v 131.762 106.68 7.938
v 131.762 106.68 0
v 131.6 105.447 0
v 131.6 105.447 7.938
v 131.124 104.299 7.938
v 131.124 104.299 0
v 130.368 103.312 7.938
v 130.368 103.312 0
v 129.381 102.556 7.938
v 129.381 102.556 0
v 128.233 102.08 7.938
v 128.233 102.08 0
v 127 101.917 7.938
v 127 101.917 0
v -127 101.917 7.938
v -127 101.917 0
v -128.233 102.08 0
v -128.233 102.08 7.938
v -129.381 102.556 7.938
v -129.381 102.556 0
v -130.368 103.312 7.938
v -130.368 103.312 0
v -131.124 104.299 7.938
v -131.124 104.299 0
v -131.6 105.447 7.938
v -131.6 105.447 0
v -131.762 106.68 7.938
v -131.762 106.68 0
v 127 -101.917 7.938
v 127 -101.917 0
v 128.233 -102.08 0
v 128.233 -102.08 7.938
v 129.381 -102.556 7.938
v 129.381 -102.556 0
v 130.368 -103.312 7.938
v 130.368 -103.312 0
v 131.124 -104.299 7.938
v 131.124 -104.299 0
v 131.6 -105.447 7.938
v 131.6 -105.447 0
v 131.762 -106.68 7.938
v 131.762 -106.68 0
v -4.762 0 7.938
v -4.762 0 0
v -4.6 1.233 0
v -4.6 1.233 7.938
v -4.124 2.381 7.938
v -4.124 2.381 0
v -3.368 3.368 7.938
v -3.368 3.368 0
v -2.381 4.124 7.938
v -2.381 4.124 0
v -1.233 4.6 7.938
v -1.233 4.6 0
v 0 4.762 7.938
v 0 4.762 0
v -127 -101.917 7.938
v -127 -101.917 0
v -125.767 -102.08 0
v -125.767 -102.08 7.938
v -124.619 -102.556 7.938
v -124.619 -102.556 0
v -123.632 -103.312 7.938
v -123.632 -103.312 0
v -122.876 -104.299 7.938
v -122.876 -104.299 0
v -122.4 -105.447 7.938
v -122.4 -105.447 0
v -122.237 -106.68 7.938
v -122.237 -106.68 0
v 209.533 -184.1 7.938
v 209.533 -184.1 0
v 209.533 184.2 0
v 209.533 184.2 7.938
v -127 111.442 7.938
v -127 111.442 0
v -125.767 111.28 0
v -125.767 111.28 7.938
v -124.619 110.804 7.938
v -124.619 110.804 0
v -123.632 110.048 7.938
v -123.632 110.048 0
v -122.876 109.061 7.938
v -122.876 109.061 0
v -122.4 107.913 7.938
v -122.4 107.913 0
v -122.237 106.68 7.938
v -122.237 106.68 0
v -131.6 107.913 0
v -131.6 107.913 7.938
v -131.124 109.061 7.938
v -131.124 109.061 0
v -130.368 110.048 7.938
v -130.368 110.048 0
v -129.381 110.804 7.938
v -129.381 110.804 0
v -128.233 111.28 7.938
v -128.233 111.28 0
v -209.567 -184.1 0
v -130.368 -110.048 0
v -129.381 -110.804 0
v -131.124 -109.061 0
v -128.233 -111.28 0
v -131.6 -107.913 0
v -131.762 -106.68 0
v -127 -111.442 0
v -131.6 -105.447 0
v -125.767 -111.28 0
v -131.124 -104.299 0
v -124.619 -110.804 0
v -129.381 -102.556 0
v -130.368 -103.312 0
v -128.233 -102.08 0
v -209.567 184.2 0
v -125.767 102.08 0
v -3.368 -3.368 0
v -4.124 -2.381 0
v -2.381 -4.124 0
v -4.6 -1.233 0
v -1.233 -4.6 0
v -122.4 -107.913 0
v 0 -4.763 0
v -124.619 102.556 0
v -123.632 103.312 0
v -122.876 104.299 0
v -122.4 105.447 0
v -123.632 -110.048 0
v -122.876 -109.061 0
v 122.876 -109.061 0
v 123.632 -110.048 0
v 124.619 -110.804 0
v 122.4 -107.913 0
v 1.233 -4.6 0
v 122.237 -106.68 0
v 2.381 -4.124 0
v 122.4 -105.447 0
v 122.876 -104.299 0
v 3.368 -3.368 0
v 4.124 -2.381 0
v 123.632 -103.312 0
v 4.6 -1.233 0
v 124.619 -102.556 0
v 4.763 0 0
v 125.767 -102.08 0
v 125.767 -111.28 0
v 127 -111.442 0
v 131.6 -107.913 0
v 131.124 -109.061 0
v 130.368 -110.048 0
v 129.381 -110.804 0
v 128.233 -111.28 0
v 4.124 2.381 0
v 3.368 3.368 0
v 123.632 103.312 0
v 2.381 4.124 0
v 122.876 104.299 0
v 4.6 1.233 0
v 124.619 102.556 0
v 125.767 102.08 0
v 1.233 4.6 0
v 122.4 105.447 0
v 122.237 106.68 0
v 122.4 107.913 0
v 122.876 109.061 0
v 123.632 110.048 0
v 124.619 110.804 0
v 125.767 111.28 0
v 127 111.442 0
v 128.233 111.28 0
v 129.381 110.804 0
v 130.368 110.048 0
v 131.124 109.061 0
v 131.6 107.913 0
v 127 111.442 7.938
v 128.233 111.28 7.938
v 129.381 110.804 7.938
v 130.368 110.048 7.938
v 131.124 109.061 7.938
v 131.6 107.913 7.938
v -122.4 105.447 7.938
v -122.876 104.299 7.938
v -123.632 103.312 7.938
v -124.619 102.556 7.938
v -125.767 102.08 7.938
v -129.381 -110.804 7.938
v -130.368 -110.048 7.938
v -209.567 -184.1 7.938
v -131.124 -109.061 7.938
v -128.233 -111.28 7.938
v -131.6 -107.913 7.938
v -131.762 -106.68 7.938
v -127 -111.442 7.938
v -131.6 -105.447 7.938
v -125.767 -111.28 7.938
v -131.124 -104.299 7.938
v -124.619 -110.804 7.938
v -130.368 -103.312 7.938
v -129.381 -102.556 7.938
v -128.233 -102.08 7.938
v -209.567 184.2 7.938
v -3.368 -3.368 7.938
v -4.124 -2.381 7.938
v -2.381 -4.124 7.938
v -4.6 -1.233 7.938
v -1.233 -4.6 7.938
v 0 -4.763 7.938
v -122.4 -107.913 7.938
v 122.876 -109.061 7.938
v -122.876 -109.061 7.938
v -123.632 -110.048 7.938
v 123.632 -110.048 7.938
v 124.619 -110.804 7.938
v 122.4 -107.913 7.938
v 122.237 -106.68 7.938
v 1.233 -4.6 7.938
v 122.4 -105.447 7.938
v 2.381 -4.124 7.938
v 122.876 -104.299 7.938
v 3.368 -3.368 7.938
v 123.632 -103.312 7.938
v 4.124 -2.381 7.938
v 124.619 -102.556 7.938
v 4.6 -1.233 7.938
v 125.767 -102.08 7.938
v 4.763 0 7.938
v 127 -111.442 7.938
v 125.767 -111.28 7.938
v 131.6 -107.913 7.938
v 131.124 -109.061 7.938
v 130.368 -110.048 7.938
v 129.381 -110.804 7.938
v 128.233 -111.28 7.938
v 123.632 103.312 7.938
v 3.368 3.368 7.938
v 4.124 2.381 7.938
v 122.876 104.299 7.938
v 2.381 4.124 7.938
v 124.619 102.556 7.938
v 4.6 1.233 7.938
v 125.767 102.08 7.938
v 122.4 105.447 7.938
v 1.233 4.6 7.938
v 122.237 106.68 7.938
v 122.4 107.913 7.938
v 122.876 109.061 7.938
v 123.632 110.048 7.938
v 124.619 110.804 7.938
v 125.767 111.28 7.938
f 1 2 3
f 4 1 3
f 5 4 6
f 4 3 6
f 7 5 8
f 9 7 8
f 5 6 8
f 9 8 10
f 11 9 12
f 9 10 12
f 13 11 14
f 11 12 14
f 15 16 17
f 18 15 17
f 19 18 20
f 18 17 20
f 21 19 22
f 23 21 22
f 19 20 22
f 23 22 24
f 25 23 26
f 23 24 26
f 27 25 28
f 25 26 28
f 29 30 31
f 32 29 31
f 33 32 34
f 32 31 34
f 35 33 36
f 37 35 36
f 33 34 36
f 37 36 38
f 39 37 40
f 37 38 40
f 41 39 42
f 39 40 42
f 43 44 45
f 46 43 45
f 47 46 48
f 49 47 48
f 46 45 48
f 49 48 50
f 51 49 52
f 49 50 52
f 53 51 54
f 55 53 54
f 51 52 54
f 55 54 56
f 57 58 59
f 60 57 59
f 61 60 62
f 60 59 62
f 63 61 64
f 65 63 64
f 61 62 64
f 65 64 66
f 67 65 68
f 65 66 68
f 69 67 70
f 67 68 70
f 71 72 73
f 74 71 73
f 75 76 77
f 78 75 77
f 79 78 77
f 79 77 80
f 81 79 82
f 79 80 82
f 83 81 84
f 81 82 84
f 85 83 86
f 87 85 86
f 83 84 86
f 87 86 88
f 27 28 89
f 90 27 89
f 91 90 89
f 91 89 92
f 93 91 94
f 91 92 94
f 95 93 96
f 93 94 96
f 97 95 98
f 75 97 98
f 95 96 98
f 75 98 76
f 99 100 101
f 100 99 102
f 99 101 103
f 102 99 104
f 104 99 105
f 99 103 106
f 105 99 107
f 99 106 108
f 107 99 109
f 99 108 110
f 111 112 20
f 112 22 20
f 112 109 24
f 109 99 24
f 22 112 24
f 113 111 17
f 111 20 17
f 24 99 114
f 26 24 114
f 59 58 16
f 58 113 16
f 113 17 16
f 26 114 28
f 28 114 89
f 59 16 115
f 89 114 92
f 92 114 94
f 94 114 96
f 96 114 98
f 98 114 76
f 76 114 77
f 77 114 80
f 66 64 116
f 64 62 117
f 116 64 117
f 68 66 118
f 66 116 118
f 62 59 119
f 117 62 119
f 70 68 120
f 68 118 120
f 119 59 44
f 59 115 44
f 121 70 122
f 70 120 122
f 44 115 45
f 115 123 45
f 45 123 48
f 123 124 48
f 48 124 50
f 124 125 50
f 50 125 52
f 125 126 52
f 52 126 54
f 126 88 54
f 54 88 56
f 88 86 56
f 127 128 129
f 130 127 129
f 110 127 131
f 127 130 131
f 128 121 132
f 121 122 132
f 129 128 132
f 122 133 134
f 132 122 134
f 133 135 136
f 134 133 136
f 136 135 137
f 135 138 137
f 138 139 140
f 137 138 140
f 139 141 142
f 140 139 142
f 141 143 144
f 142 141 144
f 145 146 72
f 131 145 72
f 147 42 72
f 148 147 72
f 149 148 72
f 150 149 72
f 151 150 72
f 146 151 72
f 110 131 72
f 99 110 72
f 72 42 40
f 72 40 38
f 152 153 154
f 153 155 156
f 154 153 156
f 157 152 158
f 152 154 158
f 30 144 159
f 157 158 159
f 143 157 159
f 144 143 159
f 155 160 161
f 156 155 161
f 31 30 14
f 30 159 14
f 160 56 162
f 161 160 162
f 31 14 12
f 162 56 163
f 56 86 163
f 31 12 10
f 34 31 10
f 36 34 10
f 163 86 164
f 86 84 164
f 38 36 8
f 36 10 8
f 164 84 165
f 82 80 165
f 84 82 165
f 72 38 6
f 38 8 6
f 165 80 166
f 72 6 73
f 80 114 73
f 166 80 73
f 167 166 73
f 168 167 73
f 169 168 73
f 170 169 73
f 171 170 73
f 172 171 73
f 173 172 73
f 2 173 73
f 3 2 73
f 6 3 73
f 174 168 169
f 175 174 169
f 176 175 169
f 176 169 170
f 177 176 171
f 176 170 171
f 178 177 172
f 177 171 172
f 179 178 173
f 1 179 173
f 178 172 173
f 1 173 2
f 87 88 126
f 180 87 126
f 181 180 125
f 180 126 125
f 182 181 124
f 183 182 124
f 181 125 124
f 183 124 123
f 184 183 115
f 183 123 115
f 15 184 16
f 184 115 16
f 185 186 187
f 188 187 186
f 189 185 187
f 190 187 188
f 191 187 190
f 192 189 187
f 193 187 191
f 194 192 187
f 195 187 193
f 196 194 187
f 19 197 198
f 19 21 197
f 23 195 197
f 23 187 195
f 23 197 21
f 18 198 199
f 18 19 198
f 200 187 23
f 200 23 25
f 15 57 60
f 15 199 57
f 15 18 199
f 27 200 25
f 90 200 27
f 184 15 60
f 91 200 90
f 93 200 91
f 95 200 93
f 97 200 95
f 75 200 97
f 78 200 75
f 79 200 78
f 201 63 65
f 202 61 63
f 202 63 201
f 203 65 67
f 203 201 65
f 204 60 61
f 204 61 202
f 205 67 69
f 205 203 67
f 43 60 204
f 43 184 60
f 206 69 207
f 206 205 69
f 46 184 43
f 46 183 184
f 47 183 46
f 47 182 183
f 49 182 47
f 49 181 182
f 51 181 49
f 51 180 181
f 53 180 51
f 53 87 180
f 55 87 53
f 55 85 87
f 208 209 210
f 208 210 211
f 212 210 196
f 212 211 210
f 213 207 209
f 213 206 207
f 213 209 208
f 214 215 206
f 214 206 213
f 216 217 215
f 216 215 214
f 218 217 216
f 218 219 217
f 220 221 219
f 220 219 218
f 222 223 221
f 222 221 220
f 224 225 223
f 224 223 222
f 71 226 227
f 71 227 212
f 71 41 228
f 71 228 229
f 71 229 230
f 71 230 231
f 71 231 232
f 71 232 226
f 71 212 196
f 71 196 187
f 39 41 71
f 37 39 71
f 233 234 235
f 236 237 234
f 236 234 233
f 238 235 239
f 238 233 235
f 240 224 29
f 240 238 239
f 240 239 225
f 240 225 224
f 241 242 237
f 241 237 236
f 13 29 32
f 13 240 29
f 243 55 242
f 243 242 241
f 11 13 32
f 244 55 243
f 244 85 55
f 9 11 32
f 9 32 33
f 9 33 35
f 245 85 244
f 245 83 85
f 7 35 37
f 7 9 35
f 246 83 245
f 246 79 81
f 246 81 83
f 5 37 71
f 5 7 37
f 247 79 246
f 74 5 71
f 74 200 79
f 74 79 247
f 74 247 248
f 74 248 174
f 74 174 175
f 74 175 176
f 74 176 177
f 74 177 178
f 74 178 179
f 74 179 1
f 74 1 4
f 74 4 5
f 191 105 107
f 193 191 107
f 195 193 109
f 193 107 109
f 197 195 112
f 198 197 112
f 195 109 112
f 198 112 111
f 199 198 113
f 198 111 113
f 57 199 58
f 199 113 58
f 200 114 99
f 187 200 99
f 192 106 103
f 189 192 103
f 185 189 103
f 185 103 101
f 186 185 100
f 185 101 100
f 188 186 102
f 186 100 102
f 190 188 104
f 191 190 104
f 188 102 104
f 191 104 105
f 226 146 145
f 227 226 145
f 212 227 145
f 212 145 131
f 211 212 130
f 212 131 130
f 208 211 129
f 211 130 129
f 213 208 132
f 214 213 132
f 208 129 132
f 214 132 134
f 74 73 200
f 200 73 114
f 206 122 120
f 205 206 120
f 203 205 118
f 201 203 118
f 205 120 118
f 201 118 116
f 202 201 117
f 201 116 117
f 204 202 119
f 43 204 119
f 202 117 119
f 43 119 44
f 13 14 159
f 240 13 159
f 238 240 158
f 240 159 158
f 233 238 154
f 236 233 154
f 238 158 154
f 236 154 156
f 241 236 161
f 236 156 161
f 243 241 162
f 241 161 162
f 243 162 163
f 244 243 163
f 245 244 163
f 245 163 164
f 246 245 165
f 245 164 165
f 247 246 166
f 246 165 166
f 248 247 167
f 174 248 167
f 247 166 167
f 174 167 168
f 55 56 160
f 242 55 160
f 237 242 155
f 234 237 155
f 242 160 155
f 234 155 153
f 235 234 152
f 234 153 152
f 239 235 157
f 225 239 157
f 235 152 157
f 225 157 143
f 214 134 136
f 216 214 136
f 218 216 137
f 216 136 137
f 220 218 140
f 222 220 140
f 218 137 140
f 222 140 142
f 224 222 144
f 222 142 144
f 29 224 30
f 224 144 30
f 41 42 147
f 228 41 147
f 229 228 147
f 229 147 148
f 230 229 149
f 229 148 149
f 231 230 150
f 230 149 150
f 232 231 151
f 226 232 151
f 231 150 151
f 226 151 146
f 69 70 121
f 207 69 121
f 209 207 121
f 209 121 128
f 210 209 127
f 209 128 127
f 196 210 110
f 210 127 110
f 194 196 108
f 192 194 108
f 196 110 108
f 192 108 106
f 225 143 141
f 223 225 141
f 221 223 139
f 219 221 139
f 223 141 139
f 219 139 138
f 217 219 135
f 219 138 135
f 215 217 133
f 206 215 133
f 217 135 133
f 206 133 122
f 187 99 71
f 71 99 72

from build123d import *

# Parameters (mm, degrees)
F1_DEPTH = 7.9375


with BuildPart() as f1:
    # F0 (on Top) → F1 (new body)
    with BuildSketch(Plane.XY):
        with BuildLine():
            Line((-131.7625, -106.68), (-209.5669363999, -106.68))
            Line((-209.5669363999, -106.68), (-209.5669363999, -184.1002450228))
            Line((-209.5669363999, -184.1002450228), (-127, -184.1002450228))
            Line((-127, -184.1002450228), (-127, -111.4425))
            ThreePointArc((-127, -111.4425), (-130.3675960454, -110.0475960454), (-131.7625, -106.68))
        make_face()
        with BuildLine():
            Line((-127, -111.4425), (-127, -184.1002450228))
            Line((-127, -184.1002450228), (0, -184.1002450228))
            Line((0, -184.1002450228), (0, -106.68))
            Line((0, -106.68), (-122.2375, -106.68))
            ThreePointArc((-122.2375, -106.68), (-123.6324039546, -110.0475960454), (-127, -111.4425))
        make_face()
        with BuildLine():
            Line((-4.7625, 0), (-127, 0))
            Line((-127, 0), (-127, -101.9175))
            ThreePointArc((-127, -101.9175), (-123.6324039546, -103.3124039546), (-122.2375, -106.68))
            Line((-122.2375, -106.68), (0, -106.68))
            Line((0, -106.68), (0, -4.7625))
            ThreePointArc((0, -4.7625), (-3.3675960454, -3.3675960454), (-4.7625, 0))
        make_face()
        with BuildLine():
            Line((-127, 0), (-209.5669363999, 0))
            Line((-209.5669363999, 0), (-209.5669363999, -106.68))
            Line((-209.5669363999, -106.68), (-131.7625, -106.68))
            ThreePointArc((-131.7625, -106.68), (-130.3675960454, -103.3124039546), (-127, -101.9175))
            Line((-127, -101.9175), (-127, 0))
        make_face()
        with BuildLine():
            Line((-131.7625, 106.68), (-209.5669363999, 106.68))
            Line((-209.5669363999, 106.68), (-209.5669363999, 0))
            Line((-209.5669363999, 0), (-127, 0))
            Line((-127, 0), (-127, 101.9175))
            ThreePointArc((-127, 101.9175), (-130.3675960454, 103.3124039546), (-131.7625, 106.68))
        make_face()
        with BuildLine():
            Line((0, 4.7625), (0, 106.68))
            Line((0, 106.68), (-122.2375, 106.68))
            ThreePointArc((-122.2375, 106.68), (-123.6324039546, 103.3124039546), (-127, 101.9175))
            Line((-127, 101.9175), (-127, 0))
            Line((-127, 0), (-4.7625, 0))
            ThreePointArc((-4.7625, 0), (-3.3675960454, 3.3675960454), (0, 4.7625))
        make_face()
        with BuildLine():
            Line((0, 184.1997549772), (-127, 184.1997549772))
            Line((-127, 184.1997549772), (-127, 111.4425))
            ThreePointArc((-127, 111.4425), (-123.6324039546, 110.0475960454), (-122.2375, 106.68))
            Line((-122.2375, 106.68), (0, 106.68))
            Line((0, 106.68), (0, 184.1997549772))
        make_face()
        with BuildLine():
            Line((-127, 184.1997549772), (-209.5669363999, 184.1997549772))
            Line((-209.5669363999, 184.1997549772), (-209.5669363999, 106.68))
            Line((-209.5669363999, 106.68), (-131.7625, 106.68))
            ThreePointArc((-131.7625, 106.68), (-130.3675960454, 110.0475960454), (-127, 111.4425))
            Line((-127, 111.4425), (-127, 184.1997549772))
        make_face()
        with BuildLine():
            Line((209.5330636001, 184.1997549772), (127, 184.1997549772))
            Line((127, 184.1997549772), (127, 111.4425))
            ThreePointArc((127, 111.4425), (130.3675960454, 110.0475960454), (131.7625, 106.68))
            Line((131.7625, 106.68), (209.5330636001, 106.68))
            Line((209.5330636001, 106.68), (209.5330636001, 184.1997549772))
        make_face()
        with BuildLine():
            Line((127, 184.1997549772), (0, 184.1997549772))
            Line((0, 184.1997549772), (0, 106.68))
            Line((0, 106.68), (122.2375, 106.68))
            ThreePointArc((122.2375, 106.68), (123.6324039546, 110.0475960454), (127, 111.4425))
            Line((127, 111.4425), (127, 184.1997549772))
        make_face()
        with BuildLine():
            Line((122.2375, 106.68), (0, 106.68))
            Line((0, 106.68), (0, 4.7625))
            ThreePointArc((0, 4.7625), (3.3675960454, 3.3675960454), (4.7625, 0))
            Line((4.7625, 0), (127, 0))
            Line((127, 0), (127, 101.9175))
            ThreePointArc((127, 101.9175), (123.6324039546, 103.3124039546), (122.2375, 106.68))
        make_face()
        with BuildLine():
            Line((209.5330636001, 0), (209.5330636001, 106.68))
            Line((209.5330636001, 106.68), (131.7625, 106.68))
            ThreePointArc((131.7625, 106.68), (130.3675960454, 103.3124039546), (127, 101.9175))
            Line((127, 101.9175), (127, 0))
            Line((127, 0), (209.5330636001, 0))
        make_face()
        with BuildLine():
            Line((127, 0), (4.7625, 0))
            ThreePointArc((4.7625, 0), (3.3675960454, -3.3675960454), (0, -4.7625))
            Line((0, -4.7625), (0, -106.68))
            Line((0, -106.68), (122.2375, -106.68))
            ThreePointArc((122.2375, -106.68), (123.6324039546, -103.3124039546), (127, -101.9175))
            Line((127, -101.9175), (127, 0))
        make_face()
        with BuildLine():
            Line((209.5330636001, -106.68), (209.5330636001, 0))
            Line((209.5330636001, 0), (127, 0))
            Line((127, 0), (127, -101.9175))
            ThreePointArc((127, -101.9175), (130.3675960454, -103.3124039546), (131.7625, -106.68))
            Line((131.7625, -106.68), (209.5330636001, -106.68))
        make_face()
        with BuildLine():
            Line((0, -106.68), (0, -184.1002450228))
            Line((0, -184.1002450228), (127, -184.1002450228))
            Line((127, -184.1002450228), (127, -111.4425))
            ThreePointArc((127, -111.4425), (123.6324039546, -110.0475960454), (122.2375, -106.68))
            Line((122.2375, -106.68), (0, -106.68))
        make_face()
        with BuildLine():
            Line((209.5330636001, -184.1002450228), (209.5330636001, -106.68))
            Line((209.5330636001, -106.68), (131.7625, -106.68))
            ThreePointArc((131.7625, -106.68), (130.3675960454, -110.0475960454), (127, -111.4425))
            Line((127, -111.4425), (127, -184.1002450228))
            Line((127, -184.1002450228), (209.5330636001, -184.1002450228))
        make_face()
    extrude(amount=F1_DEPTH)


solid = f1.part
